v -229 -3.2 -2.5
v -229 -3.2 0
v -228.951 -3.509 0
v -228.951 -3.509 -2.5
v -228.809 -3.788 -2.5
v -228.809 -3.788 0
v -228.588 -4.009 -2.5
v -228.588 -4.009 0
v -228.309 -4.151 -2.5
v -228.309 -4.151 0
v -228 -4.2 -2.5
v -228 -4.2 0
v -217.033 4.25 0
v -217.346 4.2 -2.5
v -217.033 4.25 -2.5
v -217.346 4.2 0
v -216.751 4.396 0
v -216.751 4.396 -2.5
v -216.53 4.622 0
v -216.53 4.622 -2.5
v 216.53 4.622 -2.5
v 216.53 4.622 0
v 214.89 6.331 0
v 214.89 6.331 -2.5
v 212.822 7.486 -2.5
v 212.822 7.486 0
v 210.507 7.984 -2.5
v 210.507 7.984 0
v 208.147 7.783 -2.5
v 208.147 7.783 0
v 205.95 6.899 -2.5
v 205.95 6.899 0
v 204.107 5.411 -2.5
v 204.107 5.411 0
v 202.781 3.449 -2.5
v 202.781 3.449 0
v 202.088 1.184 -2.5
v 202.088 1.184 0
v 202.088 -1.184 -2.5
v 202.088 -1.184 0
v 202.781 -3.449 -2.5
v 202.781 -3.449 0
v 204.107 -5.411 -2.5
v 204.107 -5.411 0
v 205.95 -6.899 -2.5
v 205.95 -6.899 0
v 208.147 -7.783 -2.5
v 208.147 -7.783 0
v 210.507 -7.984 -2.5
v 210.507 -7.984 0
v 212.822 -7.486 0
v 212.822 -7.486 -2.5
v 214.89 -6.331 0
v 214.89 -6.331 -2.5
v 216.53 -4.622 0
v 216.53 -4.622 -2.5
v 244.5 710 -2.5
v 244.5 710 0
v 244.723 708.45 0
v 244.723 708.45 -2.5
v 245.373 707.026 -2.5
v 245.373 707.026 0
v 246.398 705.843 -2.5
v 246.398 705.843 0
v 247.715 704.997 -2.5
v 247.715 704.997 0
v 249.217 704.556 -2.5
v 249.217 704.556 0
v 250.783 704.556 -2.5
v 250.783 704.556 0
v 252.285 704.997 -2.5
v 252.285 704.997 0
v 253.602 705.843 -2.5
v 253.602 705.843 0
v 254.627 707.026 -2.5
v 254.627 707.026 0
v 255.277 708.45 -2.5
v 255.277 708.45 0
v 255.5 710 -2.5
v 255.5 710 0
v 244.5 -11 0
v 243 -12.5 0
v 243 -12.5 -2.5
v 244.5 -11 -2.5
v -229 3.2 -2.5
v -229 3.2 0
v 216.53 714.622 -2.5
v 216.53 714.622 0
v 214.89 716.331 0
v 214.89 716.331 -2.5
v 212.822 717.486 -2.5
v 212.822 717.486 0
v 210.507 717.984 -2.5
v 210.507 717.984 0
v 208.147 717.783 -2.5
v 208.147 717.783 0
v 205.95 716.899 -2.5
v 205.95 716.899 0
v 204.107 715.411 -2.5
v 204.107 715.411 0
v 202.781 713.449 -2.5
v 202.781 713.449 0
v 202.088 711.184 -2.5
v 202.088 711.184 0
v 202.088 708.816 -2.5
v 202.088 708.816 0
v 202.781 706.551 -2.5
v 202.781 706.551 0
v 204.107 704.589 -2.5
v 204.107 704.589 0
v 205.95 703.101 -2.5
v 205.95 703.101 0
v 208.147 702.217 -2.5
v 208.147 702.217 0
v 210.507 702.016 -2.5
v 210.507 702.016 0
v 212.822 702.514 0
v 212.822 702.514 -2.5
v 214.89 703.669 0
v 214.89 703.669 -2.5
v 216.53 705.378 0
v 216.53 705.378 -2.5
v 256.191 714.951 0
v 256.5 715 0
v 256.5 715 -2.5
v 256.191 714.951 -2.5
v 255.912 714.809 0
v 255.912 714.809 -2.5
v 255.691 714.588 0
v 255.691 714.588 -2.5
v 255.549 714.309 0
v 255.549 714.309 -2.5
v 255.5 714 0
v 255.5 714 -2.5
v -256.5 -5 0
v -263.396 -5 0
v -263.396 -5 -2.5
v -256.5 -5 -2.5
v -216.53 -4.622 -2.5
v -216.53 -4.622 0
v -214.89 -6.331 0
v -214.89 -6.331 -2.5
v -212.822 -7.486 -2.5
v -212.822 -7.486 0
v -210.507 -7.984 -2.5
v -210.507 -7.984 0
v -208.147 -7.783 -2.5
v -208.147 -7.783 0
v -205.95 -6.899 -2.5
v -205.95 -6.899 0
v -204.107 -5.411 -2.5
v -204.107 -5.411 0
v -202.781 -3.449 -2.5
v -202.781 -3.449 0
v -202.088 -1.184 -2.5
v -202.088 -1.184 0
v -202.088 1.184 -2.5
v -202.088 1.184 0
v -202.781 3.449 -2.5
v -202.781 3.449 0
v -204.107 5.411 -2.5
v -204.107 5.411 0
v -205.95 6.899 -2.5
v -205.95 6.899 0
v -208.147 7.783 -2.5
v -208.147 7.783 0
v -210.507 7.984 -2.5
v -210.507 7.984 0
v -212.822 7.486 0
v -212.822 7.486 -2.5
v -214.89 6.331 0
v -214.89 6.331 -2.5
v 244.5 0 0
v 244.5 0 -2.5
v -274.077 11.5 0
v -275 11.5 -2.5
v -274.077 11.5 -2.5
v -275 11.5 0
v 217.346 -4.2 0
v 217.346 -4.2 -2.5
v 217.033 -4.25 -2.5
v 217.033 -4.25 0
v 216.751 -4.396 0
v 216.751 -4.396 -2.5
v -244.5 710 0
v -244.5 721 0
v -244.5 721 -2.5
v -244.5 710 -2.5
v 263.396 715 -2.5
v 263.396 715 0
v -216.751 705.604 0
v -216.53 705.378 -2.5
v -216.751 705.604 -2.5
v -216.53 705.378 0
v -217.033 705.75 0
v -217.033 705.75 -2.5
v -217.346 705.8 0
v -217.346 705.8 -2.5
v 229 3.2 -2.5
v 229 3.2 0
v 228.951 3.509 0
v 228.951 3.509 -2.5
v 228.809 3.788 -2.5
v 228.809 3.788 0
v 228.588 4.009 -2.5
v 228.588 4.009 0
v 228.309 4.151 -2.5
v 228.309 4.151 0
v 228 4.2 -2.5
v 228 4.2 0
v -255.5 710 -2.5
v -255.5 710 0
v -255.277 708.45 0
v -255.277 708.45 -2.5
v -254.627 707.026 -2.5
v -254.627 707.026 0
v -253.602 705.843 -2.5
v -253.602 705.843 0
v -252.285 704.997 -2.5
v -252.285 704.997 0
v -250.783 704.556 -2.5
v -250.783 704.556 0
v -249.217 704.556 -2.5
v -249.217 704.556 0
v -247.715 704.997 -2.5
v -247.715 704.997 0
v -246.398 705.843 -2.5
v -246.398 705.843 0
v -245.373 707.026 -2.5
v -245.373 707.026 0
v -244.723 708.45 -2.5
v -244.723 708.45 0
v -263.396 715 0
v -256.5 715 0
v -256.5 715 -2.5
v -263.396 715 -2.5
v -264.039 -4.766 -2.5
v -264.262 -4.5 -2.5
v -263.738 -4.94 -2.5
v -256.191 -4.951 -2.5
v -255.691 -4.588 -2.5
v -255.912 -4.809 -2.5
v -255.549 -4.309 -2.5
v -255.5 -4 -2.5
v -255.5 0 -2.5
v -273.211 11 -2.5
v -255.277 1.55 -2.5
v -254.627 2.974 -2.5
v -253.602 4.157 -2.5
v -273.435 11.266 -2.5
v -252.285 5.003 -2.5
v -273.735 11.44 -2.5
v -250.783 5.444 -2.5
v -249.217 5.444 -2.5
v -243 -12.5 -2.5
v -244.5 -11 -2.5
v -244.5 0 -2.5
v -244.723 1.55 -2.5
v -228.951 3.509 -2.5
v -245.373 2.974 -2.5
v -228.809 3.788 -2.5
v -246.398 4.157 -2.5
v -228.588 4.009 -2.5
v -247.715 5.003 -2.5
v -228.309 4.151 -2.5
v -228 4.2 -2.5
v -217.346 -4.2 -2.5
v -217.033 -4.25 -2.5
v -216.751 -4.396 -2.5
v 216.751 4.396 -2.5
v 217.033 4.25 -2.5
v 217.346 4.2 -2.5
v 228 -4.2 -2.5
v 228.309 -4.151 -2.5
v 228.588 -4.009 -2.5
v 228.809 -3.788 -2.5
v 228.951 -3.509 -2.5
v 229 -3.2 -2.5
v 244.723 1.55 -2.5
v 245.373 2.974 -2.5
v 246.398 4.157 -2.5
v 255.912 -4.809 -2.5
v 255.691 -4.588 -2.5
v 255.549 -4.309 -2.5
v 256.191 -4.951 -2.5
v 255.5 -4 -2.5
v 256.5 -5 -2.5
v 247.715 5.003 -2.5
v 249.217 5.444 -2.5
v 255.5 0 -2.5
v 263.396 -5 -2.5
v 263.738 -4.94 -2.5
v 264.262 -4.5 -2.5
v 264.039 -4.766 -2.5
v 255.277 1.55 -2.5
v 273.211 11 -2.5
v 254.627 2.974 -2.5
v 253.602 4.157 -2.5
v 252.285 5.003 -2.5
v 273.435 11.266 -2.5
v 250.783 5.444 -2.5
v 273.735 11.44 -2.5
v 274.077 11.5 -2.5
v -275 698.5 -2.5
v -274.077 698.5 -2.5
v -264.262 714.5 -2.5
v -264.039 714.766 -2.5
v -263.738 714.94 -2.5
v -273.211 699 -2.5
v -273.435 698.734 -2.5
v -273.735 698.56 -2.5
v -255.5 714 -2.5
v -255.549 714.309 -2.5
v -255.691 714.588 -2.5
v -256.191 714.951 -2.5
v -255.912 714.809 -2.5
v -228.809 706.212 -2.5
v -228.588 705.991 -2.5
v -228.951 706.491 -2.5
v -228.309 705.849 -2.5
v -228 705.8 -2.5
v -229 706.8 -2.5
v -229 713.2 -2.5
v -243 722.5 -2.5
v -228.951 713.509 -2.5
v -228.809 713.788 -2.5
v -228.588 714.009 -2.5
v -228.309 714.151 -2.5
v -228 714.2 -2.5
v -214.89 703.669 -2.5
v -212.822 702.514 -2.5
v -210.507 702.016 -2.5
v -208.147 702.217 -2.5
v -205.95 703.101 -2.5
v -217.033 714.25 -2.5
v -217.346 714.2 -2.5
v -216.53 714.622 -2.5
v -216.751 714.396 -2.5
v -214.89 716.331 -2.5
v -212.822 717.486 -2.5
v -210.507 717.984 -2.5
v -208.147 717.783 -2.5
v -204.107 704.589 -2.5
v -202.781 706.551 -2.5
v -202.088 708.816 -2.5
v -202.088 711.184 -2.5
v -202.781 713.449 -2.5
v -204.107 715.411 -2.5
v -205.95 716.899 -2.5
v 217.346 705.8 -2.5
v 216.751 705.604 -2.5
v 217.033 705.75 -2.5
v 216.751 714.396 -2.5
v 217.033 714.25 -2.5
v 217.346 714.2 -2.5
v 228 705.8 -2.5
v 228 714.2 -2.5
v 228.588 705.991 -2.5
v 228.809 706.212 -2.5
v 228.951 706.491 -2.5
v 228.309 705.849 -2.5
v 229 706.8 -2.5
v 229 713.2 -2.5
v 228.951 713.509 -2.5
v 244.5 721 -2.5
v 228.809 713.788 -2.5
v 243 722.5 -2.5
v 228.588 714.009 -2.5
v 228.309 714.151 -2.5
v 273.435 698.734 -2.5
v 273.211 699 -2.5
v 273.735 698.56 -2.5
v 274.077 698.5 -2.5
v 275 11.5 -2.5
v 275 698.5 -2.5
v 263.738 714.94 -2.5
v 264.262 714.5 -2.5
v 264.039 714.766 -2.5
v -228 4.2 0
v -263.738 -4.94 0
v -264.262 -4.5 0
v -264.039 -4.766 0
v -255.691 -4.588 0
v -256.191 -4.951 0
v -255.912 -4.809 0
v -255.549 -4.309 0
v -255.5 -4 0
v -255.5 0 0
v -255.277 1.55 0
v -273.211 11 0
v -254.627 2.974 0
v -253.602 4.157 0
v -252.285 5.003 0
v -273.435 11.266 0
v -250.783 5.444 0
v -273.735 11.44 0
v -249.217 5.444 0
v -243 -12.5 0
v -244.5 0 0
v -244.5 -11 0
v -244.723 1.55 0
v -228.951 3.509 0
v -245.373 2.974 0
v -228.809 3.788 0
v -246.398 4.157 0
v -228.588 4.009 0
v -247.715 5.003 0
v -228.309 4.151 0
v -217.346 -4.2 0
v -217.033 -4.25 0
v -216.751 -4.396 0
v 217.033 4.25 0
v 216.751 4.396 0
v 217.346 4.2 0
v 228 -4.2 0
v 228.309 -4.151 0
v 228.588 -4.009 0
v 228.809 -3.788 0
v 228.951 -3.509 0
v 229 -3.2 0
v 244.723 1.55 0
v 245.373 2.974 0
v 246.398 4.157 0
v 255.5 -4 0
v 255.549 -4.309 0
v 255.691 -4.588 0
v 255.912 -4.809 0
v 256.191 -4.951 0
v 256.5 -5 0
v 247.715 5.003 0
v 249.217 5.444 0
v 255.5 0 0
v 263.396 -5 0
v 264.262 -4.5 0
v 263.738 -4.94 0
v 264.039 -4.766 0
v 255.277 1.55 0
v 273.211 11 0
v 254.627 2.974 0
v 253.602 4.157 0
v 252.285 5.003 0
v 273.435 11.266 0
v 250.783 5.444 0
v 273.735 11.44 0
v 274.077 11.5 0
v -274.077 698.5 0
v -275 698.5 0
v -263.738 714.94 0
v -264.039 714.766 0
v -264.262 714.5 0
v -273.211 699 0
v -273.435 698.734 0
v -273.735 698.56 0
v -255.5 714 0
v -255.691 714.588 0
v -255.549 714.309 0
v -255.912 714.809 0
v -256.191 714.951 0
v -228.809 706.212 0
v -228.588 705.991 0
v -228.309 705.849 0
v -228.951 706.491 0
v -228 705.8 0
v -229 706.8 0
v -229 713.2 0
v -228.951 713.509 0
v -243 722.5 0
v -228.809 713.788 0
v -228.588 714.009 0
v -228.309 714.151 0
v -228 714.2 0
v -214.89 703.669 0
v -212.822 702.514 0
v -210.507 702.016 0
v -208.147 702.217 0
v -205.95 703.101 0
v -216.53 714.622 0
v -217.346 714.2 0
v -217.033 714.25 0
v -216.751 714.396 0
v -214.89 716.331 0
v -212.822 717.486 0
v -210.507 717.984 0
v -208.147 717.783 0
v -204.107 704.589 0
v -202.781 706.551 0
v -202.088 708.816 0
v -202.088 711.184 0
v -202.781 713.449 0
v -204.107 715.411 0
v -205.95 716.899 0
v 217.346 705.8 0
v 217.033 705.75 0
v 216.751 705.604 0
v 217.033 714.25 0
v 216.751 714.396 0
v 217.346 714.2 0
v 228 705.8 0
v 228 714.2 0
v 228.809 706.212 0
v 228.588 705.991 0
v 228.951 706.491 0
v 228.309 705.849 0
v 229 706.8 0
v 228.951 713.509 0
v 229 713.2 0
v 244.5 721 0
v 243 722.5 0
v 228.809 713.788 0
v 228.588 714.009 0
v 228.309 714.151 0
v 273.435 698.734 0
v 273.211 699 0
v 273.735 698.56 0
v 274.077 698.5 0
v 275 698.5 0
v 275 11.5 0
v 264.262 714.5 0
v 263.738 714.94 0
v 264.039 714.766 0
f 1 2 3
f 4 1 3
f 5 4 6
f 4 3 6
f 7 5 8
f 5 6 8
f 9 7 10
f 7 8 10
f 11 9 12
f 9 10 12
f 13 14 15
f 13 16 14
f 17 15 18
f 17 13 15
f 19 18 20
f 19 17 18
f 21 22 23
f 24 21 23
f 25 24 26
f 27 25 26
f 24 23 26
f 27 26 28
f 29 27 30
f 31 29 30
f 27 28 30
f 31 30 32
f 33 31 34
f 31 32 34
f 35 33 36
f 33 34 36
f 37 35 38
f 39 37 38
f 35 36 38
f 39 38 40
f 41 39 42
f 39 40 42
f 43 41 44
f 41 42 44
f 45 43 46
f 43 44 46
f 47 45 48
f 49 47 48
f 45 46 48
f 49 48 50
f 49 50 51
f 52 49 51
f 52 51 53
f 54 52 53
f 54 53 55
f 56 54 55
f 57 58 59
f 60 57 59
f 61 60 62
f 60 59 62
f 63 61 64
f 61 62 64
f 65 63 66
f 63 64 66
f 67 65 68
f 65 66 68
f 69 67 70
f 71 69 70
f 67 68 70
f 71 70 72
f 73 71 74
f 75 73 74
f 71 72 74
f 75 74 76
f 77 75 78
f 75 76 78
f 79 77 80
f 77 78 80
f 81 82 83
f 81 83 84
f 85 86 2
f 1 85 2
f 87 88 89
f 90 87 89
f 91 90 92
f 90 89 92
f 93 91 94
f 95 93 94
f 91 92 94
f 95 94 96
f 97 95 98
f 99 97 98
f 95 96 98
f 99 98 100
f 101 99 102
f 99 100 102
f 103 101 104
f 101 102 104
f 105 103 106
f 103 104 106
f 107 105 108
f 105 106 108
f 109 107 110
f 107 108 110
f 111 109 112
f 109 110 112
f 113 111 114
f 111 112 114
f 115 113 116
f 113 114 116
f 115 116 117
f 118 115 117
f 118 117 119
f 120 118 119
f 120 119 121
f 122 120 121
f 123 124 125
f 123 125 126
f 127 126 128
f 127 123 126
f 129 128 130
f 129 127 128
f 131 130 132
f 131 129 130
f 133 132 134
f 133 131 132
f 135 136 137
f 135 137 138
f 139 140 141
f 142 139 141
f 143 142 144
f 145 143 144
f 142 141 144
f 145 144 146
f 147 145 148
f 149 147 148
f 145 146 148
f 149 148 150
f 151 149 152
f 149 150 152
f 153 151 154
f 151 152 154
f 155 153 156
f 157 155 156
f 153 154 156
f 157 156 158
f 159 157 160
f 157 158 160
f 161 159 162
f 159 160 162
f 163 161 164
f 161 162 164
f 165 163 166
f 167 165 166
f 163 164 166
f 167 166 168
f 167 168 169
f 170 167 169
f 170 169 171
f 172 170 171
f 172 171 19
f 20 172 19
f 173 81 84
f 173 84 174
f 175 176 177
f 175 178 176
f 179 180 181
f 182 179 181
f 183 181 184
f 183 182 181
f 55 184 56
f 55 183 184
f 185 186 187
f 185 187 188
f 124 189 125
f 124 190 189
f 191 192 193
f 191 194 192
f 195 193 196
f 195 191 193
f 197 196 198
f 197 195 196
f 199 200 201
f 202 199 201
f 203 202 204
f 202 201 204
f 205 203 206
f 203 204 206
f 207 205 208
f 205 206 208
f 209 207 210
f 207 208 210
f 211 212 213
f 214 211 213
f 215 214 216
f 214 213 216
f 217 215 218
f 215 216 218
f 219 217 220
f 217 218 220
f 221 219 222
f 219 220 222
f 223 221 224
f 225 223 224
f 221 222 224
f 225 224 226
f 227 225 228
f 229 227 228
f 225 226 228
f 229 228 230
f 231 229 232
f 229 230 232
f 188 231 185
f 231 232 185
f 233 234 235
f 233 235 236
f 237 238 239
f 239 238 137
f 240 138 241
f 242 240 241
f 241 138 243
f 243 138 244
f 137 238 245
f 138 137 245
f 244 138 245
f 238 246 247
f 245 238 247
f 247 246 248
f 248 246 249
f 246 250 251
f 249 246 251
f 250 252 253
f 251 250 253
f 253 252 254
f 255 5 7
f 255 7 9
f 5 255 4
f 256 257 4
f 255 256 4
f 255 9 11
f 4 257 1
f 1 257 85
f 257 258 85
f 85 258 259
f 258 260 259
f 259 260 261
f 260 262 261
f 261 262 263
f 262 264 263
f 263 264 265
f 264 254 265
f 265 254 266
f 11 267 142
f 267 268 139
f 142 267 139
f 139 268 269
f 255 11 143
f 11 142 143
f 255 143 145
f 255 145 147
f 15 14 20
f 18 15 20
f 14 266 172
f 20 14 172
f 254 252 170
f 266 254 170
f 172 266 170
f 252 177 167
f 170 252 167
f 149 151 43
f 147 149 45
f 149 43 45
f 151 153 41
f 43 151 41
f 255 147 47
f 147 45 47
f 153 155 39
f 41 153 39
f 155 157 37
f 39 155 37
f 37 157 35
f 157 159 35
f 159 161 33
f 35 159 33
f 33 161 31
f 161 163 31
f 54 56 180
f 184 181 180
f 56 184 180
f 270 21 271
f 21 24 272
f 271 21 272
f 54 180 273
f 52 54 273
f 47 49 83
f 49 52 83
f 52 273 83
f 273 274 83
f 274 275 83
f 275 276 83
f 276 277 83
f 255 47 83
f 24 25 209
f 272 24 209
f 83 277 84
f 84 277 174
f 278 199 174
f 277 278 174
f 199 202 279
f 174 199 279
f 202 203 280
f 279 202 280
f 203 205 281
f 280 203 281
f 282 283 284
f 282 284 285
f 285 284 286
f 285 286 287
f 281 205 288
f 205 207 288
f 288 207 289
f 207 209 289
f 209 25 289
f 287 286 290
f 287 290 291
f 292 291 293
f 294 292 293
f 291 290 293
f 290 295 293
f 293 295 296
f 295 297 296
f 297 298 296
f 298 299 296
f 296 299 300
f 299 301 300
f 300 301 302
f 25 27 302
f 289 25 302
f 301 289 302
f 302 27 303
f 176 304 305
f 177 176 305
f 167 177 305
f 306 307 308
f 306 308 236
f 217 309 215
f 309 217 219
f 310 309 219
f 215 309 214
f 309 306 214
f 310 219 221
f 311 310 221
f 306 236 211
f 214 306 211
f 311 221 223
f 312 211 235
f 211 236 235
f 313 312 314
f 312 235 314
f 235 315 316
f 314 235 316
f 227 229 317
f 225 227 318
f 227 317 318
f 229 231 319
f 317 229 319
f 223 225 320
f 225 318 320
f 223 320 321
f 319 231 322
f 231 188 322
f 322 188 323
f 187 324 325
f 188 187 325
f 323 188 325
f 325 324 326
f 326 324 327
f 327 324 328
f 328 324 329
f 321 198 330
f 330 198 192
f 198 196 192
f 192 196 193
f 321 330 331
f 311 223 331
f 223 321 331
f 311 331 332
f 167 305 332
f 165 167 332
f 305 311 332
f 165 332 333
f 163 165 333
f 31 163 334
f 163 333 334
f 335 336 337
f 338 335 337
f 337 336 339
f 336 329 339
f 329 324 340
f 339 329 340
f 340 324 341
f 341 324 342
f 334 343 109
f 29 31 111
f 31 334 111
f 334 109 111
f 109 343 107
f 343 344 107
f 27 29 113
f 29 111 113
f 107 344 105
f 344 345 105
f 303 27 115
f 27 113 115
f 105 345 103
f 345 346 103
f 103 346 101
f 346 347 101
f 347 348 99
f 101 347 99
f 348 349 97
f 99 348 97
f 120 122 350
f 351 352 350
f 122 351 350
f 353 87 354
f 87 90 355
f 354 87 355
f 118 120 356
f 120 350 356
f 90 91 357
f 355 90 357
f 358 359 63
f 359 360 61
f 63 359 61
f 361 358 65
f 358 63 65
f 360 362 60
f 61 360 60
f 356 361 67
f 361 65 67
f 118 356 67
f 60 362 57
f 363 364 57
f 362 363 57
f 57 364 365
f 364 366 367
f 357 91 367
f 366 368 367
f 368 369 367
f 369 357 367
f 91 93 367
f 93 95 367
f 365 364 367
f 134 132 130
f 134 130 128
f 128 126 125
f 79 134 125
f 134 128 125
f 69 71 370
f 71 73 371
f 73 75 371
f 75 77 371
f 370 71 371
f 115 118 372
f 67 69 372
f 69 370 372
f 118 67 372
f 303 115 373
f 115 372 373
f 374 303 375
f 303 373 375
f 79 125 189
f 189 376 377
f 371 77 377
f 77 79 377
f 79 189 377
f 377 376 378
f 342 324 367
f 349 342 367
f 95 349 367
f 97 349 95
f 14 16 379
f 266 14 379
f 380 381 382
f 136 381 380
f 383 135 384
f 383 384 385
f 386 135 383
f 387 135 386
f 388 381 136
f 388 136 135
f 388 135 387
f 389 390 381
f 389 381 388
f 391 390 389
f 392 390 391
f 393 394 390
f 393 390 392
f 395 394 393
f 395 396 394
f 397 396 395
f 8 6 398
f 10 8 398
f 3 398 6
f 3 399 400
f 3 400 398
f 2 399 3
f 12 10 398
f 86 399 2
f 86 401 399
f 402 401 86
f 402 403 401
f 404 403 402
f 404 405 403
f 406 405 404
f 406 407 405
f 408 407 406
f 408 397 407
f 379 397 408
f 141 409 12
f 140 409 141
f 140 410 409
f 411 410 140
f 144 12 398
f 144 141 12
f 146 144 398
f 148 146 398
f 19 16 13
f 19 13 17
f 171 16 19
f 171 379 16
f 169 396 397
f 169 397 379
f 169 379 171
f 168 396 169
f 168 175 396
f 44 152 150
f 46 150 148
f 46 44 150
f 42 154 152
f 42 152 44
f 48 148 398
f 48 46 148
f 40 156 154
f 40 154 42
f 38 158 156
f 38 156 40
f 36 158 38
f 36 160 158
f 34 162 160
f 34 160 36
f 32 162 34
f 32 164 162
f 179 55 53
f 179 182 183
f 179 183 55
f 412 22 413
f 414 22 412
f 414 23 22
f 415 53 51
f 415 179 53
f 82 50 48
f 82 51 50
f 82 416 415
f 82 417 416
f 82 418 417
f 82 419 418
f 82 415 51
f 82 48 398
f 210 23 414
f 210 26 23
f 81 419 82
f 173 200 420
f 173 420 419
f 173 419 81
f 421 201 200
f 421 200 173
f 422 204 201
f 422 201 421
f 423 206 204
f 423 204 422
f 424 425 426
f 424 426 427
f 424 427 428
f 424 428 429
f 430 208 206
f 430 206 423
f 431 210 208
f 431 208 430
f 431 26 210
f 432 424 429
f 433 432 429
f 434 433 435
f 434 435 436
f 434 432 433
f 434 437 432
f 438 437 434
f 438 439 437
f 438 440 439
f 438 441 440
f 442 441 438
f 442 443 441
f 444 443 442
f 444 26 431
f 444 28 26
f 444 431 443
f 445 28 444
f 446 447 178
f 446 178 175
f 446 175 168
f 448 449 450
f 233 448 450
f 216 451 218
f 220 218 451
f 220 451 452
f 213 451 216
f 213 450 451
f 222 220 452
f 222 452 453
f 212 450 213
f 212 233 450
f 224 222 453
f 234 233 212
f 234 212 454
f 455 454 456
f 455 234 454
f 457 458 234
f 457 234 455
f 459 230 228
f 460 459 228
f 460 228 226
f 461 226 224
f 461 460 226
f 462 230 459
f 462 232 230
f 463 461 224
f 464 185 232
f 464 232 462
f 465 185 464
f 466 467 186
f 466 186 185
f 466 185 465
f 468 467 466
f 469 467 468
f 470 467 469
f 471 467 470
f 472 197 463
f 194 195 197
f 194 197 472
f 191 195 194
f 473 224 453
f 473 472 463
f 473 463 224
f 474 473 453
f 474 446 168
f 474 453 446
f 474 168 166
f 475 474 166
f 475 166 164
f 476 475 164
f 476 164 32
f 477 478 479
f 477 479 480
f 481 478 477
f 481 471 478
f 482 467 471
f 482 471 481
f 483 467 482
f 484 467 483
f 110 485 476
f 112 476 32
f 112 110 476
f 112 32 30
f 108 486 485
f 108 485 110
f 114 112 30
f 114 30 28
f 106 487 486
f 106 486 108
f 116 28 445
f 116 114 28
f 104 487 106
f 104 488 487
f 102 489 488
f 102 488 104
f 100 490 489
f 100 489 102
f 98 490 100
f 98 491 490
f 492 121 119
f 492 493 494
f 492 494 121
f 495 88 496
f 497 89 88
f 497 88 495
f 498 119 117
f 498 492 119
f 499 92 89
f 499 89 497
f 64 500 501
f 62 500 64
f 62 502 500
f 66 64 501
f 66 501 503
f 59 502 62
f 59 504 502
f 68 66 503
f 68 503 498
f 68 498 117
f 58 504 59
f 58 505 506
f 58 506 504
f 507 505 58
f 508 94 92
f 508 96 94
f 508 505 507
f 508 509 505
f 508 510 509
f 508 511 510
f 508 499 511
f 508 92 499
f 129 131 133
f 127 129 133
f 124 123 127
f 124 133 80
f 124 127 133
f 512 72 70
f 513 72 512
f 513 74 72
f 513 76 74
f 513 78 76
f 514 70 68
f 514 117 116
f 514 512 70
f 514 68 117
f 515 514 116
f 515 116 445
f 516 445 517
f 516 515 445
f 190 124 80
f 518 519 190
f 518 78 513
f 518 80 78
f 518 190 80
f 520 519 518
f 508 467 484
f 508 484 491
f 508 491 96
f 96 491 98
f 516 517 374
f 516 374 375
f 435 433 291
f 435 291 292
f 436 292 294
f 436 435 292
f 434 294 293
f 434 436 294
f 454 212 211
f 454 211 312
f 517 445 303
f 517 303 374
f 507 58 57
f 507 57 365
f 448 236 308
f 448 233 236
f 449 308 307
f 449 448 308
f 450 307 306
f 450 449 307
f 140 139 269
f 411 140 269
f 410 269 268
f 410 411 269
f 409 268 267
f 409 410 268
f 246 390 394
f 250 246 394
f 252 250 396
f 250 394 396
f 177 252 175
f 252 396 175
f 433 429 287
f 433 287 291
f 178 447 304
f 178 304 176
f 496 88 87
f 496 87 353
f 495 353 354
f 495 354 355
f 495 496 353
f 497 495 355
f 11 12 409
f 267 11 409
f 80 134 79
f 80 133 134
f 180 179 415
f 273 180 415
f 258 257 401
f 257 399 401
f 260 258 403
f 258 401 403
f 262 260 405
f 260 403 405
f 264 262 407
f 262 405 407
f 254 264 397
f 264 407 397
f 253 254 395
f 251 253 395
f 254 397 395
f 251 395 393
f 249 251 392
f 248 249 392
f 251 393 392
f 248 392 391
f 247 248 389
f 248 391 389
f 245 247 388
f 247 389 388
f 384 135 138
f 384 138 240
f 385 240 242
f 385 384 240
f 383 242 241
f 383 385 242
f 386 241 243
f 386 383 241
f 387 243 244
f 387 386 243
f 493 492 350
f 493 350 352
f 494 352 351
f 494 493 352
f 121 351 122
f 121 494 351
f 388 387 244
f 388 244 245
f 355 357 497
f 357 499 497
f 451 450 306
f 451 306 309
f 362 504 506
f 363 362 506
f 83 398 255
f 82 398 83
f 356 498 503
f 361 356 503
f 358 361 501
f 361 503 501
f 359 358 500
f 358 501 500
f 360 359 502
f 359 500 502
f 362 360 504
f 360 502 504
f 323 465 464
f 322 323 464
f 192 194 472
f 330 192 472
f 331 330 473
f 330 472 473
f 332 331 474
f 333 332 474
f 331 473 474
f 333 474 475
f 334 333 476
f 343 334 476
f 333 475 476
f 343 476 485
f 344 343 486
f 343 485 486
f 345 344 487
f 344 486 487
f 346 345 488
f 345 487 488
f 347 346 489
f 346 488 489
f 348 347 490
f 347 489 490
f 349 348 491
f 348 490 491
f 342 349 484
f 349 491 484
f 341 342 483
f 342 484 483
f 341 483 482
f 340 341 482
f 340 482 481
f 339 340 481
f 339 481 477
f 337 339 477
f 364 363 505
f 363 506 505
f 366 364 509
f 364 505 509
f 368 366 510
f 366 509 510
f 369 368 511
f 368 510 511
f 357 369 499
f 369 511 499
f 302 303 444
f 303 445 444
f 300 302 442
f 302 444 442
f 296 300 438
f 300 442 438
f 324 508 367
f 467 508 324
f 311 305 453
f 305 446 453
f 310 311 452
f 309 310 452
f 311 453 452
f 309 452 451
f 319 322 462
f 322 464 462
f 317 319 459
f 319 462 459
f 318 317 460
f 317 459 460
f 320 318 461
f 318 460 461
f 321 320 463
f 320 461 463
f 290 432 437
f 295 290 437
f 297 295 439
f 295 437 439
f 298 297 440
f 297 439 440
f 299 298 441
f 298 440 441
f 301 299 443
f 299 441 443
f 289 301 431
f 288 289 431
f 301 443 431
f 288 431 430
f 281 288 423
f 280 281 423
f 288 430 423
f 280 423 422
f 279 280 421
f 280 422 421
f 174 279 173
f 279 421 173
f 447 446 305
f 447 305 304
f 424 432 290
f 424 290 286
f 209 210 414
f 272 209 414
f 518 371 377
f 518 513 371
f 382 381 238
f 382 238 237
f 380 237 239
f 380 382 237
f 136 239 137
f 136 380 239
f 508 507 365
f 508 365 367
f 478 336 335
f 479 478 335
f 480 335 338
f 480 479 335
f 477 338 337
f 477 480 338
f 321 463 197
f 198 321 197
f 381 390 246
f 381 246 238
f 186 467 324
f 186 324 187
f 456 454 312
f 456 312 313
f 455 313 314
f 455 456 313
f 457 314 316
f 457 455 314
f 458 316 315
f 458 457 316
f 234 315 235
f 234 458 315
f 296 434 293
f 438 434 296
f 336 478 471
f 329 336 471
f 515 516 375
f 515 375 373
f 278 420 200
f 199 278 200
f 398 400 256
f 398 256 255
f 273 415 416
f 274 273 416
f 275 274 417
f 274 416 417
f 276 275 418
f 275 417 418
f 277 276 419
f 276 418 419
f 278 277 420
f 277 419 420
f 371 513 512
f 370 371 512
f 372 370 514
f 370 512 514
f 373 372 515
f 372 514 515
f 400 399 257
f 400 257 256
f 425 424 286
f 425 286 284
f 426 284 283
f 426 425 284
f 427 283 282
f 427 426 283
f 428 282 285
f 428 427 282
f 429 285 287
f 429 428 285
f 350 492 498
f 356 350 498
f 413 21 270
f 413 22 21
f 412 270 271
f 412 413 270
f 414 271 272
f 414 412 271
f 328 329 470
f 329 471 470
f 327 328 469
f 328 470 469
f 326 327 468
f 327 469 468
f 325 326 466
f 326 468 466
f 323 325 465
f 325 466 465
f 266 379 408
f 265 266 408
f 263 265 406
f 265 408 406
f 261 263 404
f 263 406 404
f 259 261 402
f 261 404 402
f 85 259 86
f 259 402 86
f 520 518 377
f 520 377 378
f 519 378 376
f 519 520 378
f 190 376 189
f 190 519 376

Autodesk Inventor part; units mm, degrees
sketch "Sketch_11" plane through (0, 0, 0) normal (0, 0, 1) x (1, 0, 0)
  line L0 (-275, 698.5) -> (-275, 11.5)
  line L1 (-275, 11.5) -> (-274.0774, 11.5)
  arc A0 (-273.2113, 11) -> (-274.0774, 11.5) centre (-274.0774, 10.5) ccw
  line L2 (-273.2113, 11) -> (-264.2624, -4.5)
  arc A1 (-264.2624, -4.5) -> (-263.3964, -5) centre (-263.3964, -4) ccw
  line L3 (-263.3964, -5) -> (-256.5, -5)
  arc A2 (-256.5, -5) -> (-255.5, -4) centre (-256.5, -4) ccw
  line L4 (-255.5, -4) -> (-255.5, 0)
  arc A3 (-244.5, 0) -> (-255.5, 0) centre (-250, 0) ccw
  line L5 (-244.5, 0) -> (-244.5, -11)
  line L6 (-244.5, -11) -> (-243, -12.5)
  line L7 (-243, -12.5) -> (243, -12.5)
  line L8 (243, -12.5) -> (244.5, -11)
  line L9 (244.5, -11) -> (244.5, 0)
  arc A4 (255.5, 0) -> (244.5, 0) centre (250, 0) ccw
  line L10 (255.5, 0) -> (255.5, -4)
  arc A5 (255.5, -4) -> (256.5, -5) centre (256.5, -4) ccw
  line L11 (256.5, -5) -> (263.3964, -5)
  arc A6 (263.3964, -5) -> (264.2624, -4.5) centre (263.3964, -4) ccw
  line L12 (264.2624, -4.5) -> (273.2113, 11)
  arc A7 (274.0774, 11.5) -> (273.2113, 11) centre (274.0774, 10.5) ccw
  line L13 (274.0774, 11.5) -> (275, 11.5)
  line L14 (275, 11.5) -> (275, 698.5)
  line L15 (275, 698.5) -> (274.0774, 698.5)
  arc A8 (273.2113, 699) -> (274.0774, 698.5) centre (274.0774, 699.5) ccw
  line L16 (273.2113, 699) -> (264.2624, 714.5)
  arc A9 (264.2624, 714.5) -> (263.3964, 715) centre (263.3964, 714) ccw
  line L17 (263.3964, 715) -> (256.5, 715)
  arc A10 (256.5, 715) -> (255.5, 714) centre (256.5, 714) ccw
  line L18 (255.5, 714) -> (255.5, 710)
  arc A11 (244.5, 710) -> (255.5, 710) centre (250, 710) ccw
  line L19 (244.5, 710) -> (244.5, 721)
  line L20 (244.5, 721) -> (243, 722.5)
  line L21 (243, 722.5) -> (-243, 722.5)
  line L22 (-243, 722.5) -> (-244.5, 721)
  line L23 (-244.5, 721) -> (-244.5, 710)
  arc A12 (-255.5, 710) -> (-244.5, 710) centre (-250, 710) ccw
  line L24 (-255.5, 710) -> (-255.5, 714)
  arc A13 (-255.5, 714) -> (-256.5, 715) centre (-256.5, 714) ccw
  line L25 (-256.5, 715) -> (-263.3964, 715)
  arc A14 (-263.3964, 715) -> (-264.2624, 714.5) centre (-263.3964, 714) ccw
  line L26 (-264.2624, 714.5) -> (-273.2113, 699)
  arc A15 (-274.0774, 698.5) -> (-273.2113, 699) centre (-274.0774, 699.5) ccw
  line L27 (-274.0774, 698.5) -> (-275, 698.5)
  arc A16 (216.5296, 4.6222) -> (216.5296, -4.6222) centre (210, 0) ccw
  arc A17 (217.3457, -4.2) -> (216.5296, -4.6222) centre (217.3457, -5.2) ccw
  line L28 (217.3457, -4.2) -> (228, -4.2)
  arc A18 (228, -4.2) -> (229, -3.2) centre (228, -3.2) ccw
  line L29 (229, -3.2) -> (229, 3.2)
  arc A19 (229, 3.2) -> (228, 4.2) centre (228, 3.2) ccw
  line L30 (228, 4.2) -> (217.3457, 4.2)
  arc A20 (216.5296, 4.6222) -> (217.3457, 4.2) centre (217.3457, 5.2) ccw
  arc A21 (216.5296, 714.6222) -> (216.5296, 705.3778) centre (210, 710) ccw
  arc A22 (217.3457, 705.8) -> (216.5296, 705.3778) centre (217.3457, 704.8) ccw
  line L31 (217.3457, 705.8) -> (228, 705.8)
  arc A23 (228, 705.8) -> (229, 706.8) centre (228, 706.8) ccw
  line L32 (229, 706.8) -> (229, 713.2)
  arc A24 (229, 713.2) -> (228, 714.2) centre (228, 713.2) ccw
  line L33 (228, 714.2) -> (217.3457, 714.2)
  arc A25 (216.5296, 714.6222) -> (217.3457, 714.2) centre (217.3457, 715.2) ccw
  line L34 (-229, 3.2) -> (-229, -3.2)
  arc A26 (-229, -3.2) -> (-228, -4.2) centre (-228, -3.2) ccw
  line L35 (-228, -4.2) -> (-217.3457, -4.2)
  arc A27 (-216.5296, -4.6222) -> (-217.3457, -4.2) centre (-217.3457, -5.2) ccw
  arc A28 (-216.5296, -4.6222) -> (-216.5296, 4.6222) centre (-210, 0) ccw
  arc A29 (-217.3457, 4.2) -> (-216.5296, 4.6222) centre (-217.3457, 5.2) ccw
  line L36 (-217.3457, 4.2) -> (-228, 4.2)
  arc A30 (-228, 4.2) -> (-229, 3.2) centre (-228, 3.2) ccw
  arc A31 (-229, 706.8) -> (-228, 705.8) centre (-228, 706.8) ccw
  line L37 (-228, 705.8) -> (-217.3457, 705.8)
  arc A32 (-216.5296, 705.3778) -> (-217.3457, 705.8) centre (-217.3457, 704.8) ccw
  arc A33 (-216.5296, 705.3778) -> (-216.5296, 714.6222) centre (-210, 710) ccw
  arc A34 (-217.3457, 714.2) -> (-216.5296, 714.6222) centre (-217.3457, 715.2) ccw
  line L38 (-217.3457, 714.2) -> (-228, 714.2)
  arc A35 (-228, 714.2) -> (-229, 713.2) centre (-228, 713.2) ccw
  line L39 (-229, 713.2) -> (-229, 706.8)
extrude "Extrusion1" add sketch "Sketch_11" against normal blind 2.5
ref_plane "MP_XY" through (0, 0, 0) normal (0, 0, 1) x (1, 0, 0)
ref_plane "MP_YZ" through (0, 0, 0) normal (1, 0, 0) x (0, 1, 0)
ref_plane "MP_ZX" through (0, 0, 0) normal (0, 1, 0) x (0, 0, 1)
ref_plane "to_EB_XY" through (224.8, 0, -2.5) normal (0, 0, 1) x (1, 0, 0)
ref_plane "to_EB_YZ" through (224.8, 0, -2.5) normal (1, 0, 0) x (0, 1, 0)
ref_plane "to_EB_ZX" through (224.8, 0, -2.5) normal (0, 1, 0) x (0, 0, 1)
properties part number "1676X_02_00_P6_(1)"
